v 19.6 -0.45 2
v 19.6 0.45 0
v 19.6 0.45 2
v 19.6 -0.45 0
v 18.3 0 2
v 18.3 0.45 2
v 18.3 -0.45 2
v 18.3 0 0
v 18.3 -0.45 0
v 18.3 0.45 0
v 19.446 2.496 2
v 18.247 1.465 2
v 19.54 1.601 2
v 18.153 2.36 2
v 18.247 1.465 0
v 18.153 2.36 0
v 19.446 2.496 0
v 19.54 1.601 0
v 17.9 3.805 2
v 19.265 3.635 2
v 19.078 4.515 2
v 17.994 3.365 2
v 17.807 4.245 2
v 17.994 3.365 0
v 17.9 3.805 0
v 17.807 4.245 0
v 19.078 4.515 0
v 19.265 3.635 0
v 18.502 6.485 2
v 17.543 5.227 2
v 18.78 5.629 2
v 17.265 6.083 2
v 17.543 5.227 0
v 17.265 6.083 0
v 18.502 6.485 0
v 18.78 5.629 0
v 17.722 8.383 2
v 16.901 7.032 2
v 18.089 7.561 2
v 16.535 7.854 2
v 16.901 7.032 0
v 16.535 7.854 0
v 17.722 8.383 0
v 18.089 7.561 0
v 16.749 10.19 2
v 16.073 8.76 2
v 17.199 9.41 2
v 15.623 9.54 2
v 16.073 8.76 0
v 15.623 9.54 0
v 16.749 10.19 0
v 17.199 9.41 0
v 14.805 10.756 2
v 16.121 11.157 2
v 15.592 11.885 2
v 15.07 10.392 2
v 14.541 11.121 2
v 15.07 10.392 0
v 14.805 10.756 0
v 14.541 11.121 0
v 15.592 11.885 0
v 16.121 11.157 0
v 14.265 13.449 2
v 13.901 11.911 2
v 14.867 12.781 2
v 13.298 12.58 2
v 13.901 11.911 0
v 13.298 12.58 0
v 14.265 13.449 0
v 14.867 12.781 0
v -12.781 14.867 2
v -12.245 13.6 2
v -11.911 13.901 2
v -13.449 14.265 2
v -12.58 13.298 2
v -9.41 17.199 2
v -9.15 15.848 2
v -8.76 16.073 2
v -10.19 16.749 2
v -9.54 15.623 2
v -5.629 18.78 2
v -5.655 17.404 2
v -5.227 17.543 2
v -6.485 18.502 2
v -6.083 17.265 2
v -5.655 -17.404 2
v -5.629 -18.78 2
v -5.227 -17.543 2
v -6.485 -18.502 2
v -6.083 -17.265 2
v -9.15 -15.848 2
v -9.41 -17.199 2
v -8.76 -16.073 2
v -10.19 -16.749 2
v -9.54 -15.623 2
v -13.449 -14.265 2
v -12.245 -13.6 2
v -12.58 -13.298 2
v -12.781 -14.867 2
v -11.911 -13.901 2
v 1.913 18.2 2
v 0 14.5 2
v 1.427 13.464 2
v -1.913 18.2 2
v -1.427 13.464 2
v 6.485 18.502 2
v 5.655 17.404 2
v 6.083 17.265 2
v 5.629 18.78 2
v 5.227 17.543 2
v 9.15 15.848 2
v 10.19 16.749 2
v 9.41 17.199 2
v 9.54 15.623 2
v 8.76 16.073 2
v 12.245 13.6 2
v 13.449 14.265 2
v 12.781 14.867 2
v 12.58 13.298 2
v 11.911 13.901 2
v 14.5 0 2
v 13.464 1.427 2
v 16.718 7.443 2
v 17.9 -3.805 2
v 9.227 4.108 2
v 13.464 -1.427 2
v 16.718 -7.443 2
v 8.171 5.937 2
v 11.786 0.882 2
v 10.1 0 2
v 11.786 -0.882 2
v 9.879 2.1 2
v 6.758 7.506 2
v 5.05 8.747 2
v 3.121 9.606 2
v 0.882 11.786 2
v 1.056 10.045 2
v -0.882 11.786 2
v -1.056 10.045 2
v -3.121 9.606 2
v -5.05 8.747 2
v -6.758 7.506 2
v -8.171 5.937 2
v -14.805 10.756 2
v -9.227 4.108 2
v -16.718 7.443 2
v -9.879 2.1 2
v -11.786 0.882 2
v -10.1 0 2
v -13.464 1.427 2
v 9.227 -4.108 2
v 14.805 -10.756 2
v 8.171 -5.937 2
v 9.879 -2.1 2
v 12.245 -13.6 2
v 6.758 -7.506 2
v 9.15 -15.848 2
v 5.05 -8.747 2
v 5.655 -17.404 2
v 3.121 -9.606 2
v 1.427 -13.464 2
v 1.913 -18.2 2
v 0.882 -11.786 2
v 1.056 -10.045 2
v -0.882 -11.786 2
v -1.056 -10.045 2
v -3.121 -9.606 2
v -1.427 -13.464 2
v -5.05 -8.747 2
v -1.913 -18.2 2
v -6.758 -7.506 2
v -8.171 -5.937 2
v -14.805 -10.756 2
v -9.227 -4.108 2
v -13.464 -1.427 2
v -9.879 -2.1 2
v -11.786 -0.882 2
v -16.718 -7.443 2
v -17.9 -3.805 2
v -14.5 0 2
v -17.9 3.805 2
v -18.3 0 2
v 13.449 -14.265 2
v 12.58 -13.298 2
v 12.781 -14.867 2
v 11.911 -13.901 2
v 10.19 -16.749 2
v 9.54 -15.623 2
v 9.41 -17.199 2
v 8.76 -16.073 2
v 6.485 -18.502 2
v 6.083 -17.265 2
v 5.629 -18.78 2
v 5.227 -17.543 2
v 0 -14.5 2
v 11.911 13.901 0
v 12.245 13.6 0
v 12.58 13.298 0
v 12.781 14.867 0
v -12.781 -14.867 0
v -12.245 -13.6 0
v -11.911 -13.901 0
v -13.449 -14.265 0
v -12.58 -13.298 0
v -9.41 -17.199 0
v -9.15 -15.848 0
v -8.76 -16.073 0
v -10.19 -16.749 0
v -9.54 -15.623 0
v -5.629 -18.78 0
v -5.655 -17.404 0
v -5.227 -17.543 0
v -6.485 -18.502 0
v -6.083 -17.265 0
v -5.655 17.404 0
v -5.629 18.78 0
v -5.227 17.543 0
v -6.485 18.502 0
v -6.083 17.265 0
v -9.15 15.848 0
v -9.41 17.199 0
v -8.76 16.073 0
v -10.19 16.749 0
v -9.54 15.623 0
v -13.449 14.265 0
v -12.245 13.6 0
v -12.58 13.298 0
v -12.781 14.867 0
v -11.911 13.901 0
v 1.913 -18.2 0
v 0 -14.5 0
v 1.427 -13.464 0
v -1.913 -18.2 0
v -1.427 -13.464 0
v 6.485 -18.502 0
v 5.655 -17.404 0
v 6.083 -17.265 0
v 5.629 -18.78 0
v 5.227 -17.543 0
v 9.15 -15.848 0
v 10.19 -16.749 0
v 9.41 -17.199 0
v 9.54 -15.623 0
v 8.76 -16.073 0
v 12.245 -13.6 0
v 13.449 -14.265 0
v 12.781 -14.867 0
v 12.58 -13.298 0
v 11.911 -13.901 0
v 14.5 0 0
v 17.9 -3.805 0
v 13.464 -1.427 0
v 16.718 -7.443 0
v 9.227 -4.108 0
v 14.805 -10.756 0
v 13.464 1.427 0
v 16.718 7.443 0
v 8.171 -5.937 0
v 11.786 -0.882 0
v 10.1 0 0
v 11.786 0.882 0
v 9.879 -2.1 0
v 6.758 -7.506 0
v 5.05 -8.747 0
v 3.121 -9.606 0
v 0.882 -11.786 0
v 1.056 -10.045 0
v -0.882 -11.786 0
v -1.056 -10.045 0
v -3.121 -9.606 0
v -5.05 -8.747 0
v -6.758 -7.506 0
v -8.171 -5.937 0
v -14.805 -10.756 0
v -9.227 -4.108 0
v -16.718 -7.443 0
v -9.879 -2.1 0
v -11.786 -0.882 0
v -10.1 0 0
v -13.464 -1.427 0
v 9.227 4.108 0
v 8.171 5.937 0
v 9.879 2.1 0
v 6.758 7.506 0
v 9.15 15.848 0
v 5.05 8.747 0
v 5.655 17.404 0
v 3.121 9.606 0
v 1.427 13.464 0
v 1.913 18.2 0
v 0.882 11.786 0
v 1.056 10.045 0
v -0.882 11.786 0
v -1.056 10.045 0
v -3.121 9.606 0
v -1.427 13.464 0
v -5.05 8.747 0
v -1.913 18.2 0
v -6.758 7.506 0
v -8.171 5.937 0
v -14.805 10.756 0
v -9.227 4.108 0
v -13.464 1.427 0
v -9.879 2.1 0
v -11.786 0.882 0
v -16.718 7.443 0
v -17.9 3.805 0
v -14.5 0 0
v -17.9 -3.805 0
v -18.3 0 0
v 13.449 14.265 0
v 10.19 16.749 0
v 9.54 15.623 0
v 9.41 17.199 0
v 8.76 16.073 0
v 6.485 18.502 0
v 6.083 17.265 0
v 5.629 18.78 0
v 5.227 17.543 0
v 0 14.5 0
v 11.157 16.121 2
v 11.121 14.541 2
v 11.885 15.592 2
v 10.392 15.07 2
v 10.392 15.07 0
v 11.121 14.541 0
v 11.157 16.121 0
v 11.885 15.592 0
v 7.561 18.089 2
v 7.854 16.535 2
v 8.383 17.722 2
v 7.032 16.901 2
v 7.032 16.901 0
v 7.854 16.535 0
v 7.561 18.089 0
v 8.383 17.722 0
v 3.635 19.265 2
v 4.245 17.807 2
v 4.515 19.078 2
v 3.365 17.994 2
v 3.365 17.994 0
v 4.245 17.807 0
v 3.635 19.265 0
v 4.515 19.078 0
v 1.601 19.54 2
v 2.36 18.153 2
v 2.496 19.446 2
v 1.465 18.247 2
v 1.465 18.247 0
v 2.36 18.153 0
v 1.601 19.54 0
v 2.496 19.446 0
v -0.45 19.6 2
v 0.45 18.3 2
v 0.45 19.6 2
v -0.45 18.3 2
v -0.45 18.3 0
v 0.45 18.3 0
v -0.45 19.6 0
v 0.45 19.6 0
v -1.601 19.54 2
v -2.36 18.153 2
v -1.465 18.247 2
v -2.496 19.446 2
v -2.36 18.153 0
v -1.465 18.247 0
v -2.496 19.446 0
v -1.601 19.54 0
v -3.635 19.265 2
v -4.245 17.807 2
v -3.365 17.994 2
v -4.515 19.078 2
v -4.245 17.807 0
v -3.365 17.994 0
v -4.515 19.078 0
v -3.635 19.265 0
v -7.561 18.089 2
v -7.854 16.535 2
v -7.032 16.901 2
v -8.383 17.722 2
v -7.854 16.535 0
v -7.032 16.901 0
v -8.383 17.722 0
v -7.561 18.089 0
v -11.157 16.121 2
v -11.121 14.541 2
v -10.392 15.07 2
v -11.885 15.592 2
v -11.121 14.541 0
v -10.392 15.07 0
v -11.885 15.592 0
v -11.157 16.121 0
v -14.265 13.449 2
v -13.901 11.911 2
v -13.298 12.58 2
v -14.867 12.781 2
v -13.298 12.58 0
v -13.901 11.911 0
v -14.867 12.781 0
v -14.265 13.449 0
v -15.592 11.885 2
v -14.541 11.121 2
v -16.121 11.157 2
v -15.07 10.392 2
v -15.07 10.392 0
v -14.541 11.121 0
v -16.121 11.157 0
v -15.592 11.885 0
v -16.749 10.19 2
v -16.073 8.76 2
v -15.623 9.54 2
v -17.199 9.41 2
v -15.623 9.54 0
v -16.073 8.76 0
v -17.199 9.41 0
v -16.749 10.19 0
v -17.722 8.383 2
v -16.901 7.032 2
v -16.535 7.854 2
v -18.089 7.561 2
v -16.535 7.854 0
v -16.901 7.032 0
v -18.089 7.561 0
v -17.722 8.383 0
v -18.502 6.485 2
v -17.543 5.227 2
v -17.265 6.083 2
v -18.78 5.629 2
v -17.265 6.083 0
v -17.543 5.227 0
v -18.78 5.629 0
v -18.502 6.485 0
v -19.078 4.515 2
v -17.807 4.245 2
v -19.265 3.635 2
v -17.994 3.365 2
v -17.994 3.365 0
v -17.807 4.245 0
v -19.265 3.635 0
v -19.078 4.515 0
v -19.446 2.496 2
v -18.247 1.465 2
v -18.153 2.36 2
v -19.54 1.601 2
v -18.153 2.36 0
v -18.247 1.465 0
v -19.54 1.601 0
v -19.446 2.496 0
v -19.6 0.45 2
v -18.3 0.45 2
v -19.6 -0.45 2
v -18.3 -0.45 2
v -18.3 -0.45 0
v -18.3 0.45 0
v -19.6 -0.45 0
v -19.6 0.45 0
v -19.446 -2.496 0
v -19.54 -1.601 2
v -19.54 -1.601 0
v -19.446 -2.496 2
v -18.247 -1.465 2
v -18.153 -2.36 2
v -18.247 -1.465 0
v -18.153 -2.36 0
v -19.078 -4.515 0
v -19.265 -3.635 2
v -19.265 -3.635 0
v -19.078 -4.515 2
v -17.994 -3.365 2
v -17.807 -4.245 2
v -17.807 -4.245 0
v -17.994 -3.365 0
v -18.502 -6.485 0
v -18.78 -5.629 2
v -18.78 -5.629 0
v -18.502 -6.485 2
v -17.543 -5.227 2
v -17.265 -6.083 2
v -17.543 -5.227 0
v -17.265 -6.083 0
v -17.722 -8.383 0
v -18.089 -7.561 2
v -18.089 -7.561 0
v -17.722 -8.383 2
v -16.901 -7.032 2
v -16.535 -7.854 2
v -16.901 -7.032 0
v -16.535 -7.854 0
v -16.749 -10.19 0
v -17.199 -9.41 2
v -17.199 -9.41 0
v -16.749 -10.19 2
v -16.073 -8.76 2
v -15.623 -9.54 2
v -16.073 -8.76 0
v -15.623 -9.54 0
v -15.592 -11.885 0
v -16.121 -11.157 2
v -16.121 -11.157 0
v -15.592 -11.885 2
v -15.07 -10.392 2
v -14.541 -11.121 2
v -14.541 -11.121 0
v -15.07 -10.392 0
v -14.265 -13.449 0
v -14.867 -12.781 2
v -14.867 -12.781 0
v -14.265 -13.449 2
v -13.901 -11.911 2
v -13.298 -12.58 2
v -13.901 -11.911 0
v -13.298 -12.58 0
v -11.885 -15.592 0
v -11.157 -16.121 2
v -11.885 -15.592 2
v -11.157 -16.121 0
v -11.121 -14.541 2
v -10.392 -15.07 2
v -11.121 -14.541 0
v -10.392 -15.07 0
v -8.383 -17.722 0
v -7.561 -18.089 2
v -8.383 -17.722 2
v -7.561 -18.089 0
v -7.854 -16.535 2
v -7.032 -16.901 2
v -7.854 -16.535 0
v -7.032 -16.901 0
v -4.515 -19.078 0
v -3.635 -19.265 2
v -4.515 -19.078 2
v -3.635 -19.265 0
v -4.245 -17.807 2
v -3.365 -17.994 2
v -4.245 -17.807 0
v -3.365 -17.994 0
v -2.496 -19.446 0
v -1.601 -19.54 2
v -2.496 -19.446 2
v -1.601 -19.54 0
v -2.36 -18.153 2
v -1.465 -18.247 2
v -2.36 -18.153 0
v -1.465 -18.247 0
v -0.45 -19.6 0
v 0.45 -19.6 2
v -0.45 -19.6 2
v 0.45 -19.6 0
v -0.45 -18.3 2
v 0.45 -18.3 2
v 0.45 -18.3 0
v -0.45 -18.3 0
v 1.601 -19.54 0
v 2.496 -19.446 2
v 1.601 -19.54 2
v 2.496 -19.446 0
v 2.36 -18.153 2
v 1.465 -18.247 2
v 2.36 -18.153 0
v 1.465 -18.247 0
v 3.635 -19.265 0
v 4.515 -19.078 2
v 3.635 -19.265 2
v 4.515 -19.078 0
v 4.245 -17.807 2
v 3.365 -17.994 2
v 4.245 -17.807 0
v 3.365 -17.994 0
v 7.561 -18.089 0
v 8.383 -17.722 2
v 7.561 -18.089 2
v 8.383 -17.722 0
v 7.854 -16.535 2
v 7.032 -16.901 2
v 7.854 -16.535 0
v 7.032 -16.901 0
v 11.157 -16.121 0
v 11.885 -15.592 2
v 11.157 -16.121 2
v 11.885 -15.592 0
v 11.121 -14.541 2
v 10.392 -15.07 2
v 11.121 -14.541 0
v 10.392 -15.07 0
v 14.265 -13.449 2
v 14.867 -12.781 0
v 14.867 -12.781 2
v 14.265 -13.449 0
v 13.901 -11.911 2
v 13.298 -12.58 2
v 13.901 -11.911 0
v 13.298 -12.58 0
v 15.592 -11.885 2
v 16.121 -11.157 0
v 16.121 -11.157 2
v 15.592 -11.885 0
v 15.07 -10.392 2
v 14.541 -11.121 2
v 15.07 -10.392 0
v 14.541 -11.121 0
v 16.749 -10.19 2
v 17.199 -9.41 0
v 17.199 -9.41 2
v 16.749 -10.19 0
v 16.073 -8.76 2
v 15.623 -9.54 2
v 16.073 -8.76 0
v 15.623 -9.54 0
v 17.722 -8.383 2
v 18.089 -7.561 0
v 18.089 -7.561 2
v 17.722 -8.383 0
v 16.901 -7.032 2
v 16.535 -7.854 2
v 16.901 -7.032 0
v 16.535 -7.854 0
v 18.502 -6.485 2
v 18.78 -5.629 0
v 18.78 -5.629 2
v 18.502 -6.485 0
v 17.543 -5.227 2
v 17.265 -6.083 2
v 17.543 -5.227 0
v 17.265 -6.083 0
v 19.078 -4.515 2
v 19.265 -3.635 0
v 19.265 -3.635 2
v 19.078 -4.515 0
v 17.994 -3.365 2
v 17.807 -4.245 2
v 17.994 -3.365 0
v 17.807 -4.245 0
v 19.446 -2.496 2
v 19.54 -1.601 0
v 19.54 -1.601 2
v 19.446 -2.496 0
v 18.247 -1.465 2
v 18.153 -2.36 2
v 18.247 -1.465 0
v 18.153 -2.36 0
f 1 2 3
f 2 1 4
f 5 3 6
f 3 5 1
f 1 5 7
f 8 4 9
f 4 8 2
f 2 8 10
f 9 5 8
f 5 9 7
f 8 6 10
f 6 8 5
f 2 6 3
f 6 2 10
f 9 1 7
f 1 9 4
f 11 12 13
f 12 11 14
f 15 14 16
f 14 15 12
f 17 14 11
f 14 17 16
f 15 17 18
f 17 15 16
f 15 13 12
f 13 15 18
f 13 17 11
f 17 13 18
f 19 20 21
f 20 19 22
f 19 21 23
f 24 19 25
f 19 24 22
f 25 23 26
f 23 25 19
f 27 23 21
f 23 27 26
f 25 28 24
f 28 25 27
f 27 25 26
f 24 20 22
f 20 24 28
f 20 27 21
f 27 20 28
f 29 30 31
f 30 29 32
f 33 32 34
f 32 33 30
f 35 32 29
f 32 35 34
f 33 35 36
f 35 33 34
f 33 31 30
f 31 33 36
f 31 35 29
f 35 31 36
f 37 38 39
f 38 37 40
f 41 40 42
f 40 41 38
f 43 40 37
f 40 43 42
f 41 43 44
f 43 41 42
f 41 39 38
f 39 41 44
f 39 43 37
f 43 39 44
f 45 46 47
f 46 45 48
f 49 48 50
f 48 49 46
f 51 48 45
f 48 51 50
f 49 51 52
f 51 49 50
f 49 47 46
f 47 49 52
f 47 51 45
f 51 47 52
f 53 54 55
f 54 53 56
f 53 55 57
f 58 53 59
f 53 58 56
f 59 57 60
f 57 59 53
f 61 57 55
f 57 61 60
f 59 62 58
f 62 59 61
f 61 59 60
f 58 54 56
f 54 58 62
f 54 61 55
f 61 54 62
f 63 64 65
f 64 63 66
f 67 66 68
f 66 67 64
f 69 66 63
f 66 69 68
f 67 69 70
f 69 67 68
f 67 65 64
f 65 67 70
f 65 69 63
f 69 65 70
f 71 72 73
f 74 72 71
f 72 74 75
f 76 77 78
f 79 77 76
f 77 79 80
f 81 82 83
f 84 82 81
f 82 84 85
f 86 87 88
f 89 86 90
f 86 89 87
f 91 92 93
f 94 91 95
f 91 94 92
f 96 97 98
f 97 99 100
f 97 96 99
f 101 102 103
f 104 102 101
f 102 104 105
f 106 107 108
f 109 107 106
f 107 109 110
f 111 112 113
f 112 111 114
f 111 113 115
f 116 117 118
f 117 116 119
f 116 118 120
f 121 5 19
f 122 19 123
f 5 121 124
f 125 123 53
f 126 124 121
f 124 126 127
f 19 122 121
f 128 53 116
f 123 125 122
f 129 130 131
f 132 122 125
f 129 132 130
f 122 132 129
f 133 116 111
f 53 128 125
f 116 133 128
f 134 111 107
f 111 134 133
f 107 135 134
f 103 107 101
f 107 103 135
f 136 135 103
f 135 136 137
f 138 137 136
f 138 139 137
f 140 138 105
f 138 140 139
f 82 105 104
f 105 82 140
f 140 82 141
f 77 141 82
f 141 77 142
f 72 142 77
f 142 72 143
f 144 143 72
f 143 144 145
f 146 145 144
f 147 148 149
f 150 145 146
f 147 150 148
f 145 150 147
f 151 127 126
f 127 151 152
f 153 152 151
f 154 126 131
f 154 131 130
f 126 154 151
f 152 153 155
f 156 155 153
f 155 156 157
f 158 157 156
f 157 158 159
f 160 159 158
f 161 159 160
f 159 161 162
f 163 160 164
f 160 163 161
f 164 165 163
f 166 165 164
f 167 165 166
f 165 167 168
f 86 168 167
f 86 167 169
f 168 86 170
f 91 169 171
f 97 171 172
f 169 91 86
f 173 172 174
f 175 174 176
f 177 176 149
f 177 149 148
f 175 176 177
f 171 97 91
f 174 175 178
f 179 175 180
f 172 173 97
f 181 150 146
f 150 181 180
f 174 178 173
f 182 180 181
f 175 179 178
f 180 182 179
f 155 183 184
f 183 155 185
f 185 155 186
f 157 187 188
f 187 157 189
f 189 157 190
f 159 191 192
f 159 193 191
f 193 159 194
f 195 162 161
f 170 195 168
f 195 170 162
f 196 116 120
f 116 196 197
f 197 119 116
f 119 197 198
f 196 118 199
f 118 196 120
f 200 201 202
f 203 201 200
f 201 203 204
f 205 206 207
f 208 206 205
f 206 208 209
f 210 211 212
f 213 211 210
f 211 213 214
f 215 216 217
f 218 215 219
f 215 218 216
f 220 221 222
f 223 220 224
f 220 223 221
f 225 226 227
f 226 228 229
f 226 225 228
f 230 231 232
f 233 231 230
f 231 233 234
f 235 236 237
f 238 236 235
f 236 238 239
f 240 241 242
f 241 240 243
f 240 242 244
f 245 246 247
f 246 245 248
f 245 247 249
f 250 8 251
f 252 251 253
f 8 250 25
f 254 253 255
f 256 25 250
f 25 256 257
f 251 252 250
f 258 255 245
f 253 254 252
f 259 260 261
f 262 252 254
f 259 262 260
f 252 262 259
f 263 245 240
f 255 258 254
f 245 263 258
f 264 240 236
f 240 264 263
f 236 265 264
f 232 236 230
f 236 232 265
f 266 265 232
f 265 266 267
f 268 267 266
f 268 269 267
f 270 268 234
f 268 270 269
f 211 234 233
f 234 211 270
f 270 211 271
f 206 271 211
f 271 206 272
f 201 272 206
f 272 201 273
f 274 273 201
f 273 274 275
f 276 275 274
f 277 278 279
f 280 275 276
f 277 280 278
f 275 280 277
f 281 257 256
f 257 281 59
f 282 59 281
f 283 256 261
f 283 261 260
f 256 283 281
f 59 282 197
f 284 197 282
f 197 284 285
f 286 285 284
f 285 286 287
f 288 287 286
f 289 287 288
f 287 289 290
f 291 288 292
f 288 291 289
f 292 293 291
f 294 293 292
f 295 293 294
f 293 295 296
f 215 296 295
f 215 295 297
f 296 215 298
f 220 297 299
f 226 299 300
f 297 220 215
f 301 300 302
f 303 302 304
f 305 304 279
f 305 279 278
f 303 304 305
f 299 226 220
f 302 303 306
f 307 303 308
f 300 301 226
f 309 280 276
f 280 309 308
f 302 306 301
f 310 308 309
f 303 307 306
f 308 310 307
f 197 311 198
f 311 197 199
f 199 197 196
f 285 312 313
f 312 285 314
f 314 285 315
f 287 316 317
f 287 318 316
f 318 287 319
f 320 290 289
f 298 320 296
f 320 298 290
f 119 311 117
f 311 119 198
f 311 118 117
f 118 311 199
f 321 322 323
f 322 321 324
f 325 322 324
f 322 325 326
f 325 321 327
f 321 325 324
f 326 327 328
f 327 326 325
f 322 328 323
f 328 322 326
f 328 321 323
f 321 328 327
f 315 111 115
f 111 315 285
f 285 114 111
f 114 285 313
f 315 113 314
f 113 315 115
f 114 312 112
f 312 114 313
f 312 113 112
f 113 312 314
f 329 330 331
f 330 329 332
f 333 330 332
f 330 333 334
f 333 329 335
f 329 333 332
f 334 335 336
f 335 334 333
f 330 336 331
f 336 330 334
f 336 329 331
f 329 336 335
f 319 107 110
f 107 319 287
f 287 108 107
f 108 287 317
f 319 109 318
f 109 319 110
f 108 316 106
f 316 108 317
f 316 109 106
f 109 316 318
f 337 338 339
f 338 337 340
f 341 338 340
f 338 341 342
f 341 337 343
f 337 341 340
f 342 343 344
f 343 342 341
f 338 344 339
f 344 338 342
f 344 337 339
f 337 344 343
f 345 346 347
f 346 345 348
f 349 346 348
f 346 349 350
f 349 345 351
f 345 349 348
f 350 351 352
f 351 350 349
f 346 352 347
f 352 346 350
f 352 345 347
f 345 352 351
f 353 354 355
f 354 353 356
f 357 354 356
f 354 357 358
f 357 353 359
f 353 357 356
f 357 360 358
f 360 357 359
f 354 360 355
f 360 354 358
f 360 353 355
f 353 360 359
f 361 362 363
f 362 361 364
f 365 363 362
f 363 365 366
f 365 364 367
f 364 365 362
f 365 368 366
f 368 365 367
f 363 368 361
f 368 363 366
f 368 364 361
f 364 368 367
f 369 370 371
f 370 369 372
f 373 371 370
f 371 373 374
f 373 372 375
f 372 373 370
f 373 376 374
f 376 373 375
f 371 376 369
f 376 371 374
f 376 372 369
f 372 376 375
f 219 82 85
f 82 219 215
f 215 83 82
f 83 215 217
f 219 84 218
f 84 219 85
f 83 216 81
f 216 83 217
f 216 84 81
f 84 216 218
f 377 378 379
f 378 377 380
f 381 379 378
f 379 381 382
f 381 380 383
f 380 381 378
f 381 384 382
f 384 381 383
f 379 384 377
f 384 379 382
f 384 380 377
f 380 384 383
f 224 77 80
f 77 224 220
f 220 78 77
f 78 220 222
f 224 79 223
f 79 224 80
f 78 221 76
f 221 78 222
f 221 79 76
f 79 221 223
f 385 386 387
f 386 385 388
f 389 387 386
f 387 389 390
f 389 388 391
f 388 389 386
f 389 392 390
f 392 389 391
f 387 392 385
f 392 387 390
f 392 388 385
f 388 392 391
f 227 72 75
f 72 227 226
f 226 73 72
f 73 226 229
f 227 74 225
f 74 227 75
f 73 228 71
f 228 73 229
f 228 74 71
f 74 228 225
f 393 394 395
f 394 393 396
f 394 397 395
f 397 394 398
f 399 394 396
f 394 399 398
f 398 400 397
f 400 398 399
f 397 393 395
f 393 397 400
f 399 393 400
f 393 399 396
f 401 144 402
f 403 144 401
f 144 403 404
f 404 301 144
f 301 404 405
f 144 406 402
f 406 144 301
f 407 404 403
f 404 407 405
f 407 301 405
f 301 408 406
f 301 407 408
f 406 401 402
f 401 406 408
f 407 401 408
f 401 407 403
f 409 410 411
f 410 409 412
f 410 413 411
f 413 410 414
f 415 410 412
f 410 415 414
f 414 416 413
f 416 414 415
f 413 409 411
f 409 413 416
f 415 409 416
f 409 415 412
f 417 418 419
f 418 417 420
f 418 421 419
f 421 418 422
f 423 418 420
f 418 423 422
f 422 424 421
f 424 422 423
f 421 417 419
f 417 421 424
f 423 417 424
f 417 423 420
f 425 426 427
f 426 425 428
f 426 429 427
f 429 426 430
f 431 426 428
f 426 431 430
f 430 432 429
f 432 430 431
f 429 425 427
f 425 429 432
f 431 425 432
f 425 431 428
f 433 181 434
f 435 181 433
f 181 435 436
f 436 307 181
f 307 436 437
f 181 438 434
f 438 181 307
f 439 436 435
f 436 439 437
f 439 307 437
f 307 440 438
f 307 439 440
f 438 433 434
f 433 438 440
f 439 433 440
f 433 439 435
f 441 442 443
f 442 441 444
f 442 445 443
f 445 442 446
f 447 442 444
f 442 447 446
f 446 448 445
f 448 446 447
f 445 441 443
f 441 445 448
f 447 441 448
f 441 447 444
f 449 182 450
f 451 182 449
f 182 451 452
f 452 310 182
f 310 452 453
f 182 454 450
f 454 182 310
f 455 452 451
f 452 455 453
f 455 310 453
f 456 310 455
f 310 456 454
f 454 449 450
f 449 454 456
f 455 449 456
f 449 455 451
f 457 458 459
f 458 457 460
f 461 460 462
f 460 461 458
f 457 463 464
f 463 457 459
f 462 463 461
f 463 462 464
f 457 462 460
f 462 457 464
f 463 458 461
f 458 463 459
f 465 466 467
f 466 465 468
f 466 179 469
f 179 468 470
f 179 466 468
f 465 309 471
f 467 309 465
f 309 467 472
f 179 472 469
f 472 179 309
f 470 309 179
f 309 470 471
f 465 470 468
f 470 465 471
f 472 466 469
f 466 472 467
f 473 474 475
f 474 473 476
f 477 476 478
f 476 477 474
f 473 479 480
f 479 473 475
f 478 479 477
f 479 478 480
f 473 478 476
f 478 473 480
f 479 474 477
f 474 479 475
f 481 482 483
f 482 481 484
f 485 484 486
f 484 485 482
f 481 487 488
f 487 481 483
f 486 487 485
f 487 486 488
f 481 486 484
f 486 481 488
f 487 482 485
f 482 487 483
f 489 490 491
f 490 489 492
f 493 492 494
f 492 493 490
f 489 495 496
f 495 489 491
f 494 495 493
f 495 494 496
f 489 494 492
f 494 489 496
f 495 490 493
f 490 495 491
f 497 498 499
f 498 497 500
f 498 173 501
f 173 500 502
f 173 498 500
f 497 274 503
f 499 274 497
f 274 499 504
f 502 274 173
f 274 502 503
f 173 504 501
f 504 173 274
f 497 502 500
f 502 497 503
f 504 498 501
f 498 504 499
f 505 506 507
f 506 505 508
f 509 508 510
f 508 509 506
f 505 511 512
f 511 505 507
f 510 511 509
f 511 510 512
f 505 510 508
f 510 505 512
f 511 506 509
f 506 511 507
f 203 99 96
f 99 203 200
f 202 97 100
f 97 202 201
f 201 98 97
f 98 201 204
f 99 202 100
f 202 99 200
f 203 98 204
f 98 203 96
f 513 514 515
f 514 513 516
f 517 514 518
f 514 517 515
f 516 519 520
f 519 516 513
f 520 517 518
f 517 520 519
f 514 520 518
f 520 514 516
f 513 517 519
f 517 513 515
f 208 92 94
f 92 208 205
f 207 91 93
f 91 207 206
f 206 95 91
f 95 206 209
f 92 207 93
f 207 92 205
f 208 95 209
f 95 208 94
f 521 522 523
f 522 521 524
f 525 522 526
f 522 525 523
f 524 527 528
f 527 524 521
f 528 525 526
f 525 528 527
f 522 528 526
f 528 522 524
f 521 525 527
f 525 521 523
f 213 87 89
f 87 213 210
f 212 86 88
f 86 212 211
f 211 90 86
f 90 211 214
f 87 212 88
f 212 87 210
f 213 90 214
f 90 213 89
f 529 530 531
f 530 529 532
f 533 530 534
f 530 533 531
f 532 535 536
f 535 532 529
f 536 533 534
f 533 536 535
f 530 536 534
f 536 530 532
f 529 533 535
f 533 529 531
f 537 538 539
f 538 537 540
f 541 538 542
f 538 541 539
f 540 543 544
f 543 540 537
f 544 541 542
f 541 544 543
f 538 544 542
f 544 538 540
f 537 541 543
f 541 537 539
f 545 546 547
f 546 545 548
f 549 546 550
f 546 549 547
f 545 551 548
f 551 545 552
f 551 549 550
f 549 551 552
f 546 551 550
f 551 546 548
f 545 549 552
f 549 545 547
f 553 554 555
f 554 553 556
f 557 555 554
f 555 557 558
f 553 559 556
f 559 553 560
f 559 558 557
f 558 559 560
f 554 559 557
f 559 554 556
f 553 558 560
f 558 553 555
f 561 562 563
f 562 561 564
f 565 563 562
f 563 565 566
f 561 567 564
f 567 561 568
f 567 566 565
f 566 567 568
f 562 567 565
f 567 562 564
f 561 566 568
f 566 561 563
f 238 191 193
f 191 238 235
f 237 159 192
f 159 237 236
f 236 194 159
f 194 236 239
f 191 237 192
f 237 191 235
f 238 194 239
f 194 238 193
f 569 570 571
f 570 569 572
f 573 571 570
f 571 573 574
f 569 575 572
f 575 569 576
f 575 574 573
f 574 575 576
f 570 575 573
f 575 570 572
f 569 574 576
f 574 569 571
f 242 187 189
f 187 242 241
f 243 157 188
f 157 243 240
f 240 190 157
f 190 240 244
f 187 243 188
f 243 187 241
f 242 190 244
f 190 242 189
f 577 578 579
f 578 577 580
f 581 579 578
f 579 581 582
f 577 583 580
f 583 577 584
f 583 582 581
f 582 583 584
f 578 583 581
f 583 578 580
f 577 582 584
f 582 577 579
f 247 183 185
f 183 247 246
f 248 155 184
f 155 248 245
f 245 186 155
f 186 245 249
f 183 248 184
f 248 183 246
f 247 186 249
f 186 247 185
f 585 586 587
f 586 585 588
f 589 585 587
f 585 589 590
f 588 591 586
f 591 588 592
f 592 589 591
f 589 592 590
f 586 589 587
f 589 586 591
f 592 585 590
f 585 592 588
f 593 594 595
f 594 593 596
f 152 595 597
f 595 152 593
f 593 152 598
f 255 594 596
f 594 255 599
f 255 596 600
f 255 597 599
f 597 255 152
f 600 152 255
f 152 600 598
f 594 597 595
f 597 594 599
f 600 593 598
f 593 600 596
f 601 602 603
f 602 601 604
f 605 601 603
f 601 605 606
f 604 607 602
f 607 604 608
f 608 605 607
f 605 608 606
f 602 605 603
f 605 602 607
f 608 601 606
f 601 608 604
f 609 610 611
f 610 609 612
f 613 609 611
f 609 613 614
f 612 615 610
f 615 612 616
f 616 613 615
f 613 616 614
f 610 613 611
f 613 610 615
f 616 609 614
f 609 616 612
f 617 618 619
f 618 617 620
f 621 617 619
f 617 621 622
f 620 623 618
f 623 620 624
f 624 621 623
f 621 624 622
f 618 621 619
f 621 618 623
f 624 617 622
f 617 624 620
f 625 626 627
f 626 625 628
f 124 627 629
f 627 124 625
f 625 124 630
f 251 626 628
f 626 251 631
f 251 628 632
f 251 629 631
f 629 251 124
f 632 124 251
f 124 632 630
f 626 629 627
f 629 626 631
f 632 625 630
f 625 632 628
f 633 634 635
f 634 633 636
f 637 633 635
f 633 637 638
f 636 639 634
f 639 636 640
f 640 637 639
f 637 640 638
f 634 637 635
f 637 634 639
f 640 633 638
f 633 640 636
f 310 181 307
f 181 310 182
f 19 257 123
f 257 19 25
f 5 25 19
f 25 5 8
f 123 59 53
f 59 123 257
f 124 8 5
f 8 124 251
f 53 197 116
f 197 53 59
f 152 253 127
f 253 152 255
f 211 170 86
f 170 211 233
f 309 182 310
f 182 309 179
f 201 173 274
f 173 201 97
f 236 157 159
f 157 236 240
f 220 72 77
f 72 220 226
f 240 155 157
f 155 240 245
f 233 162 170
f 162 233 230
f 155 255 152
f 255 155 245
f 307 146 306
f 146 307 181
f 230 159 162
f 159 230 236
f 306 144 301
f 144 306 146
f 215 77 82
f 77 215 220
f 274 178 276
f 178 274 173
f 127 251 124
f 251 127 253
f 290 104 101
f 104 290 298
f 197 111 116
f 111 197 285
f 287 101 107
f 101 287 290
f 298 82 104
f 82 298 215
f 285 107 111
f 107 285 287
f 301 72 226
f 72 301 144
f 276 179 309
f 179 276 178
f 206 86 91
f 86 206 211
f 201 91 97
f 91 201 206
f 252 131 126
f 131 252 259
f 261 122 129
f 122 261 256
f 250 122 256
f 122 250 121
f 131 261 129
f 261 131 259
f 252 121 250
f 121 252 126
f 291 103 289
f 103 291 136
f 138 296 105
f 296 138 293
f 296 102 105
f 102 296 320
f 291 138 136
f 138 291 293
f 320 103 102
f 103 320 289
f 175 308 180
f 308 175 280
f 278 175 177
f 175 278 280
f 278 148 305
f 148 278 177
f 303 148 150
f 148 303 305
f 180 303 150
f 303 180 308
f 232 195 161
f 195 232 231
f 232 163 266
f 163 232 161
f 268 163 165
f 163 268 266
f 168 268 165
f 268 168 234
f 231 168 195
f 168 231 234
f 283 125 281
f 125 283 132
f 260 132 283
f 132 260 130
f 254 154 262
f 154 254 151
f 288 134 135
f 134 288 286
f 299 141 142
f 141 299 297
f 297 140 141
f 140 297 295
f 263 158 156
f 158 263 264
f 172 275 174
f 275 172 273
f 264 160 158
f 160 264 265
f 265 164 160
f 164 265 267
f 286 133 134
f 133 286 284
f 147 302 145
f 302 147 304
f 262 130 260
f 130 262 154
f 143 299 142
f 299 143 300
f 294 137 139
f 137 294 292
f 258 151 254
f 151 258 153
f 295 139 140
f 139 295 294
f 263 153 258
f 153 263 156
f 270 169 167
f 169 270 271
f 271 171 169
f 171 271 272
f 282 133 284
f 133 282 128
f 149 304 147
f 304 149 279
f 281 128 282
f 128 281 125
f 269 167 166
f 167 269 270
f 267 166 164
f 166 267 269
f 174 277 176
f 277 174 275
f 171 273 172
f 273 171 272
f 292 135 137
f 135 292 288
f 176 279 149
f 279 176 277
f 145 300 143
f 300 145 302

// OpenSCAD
// part_id: sp1
// name: SP1 superior gear
// source_drawing_ids: DRW-022;DRW-056
// units: mm
// revision: 0.3-drw022
// SPDX-License-Identifier: MIT

module sp1_tooth_ring(root_d = 36.6, tip_d = 39.2, tooth_count = 60, thickness = 2.0, tooth_w = 0.9) {
    union() {
        cylinder(d = root_d, h = thickness, center = false);
        for (a = [0 : 360 / tooth_count : 360 - 360 / tooth_count]) {
            rotate([0, 0, a])
                translate([root_d / 2, 0, 0])
                    translate([0, -tooth_w / 2, 0])
                        cube([(tip_d - root_d) / 2, tooth_w, thickness], center = false);
        }
    }
}

module part_sp1(
    od = 39.2,
    thickness = 2.0,
    root_d = 36.6,
    tooth_count = 60,
    bore_d = 20.2,
    bolt_d = 3.0,
    bolt_r = 13.0
) {
    difference() {
        sp1_tooth_ring(root_d = root_d, tip_d = od, tooth_count = tooth_count, thickness = thickness);
        translate([0, 0, -0.1]) cylinder(d = bore_d, h = thickness + 0.2, center = false);
        for (a = [0, 90, 180, 270]) {
            rotate([0, 0, a]) translate([bolt_r, 0, -0.1])
                cylinder(d = bolt_d, h = thickness + 0.2, center = false);
        }
    }
}

// ---- "main guard" ----
// Default to previewing when opened directly:
if (is_undef(__LIB_MODE__)) {
    part_sp1();
}
